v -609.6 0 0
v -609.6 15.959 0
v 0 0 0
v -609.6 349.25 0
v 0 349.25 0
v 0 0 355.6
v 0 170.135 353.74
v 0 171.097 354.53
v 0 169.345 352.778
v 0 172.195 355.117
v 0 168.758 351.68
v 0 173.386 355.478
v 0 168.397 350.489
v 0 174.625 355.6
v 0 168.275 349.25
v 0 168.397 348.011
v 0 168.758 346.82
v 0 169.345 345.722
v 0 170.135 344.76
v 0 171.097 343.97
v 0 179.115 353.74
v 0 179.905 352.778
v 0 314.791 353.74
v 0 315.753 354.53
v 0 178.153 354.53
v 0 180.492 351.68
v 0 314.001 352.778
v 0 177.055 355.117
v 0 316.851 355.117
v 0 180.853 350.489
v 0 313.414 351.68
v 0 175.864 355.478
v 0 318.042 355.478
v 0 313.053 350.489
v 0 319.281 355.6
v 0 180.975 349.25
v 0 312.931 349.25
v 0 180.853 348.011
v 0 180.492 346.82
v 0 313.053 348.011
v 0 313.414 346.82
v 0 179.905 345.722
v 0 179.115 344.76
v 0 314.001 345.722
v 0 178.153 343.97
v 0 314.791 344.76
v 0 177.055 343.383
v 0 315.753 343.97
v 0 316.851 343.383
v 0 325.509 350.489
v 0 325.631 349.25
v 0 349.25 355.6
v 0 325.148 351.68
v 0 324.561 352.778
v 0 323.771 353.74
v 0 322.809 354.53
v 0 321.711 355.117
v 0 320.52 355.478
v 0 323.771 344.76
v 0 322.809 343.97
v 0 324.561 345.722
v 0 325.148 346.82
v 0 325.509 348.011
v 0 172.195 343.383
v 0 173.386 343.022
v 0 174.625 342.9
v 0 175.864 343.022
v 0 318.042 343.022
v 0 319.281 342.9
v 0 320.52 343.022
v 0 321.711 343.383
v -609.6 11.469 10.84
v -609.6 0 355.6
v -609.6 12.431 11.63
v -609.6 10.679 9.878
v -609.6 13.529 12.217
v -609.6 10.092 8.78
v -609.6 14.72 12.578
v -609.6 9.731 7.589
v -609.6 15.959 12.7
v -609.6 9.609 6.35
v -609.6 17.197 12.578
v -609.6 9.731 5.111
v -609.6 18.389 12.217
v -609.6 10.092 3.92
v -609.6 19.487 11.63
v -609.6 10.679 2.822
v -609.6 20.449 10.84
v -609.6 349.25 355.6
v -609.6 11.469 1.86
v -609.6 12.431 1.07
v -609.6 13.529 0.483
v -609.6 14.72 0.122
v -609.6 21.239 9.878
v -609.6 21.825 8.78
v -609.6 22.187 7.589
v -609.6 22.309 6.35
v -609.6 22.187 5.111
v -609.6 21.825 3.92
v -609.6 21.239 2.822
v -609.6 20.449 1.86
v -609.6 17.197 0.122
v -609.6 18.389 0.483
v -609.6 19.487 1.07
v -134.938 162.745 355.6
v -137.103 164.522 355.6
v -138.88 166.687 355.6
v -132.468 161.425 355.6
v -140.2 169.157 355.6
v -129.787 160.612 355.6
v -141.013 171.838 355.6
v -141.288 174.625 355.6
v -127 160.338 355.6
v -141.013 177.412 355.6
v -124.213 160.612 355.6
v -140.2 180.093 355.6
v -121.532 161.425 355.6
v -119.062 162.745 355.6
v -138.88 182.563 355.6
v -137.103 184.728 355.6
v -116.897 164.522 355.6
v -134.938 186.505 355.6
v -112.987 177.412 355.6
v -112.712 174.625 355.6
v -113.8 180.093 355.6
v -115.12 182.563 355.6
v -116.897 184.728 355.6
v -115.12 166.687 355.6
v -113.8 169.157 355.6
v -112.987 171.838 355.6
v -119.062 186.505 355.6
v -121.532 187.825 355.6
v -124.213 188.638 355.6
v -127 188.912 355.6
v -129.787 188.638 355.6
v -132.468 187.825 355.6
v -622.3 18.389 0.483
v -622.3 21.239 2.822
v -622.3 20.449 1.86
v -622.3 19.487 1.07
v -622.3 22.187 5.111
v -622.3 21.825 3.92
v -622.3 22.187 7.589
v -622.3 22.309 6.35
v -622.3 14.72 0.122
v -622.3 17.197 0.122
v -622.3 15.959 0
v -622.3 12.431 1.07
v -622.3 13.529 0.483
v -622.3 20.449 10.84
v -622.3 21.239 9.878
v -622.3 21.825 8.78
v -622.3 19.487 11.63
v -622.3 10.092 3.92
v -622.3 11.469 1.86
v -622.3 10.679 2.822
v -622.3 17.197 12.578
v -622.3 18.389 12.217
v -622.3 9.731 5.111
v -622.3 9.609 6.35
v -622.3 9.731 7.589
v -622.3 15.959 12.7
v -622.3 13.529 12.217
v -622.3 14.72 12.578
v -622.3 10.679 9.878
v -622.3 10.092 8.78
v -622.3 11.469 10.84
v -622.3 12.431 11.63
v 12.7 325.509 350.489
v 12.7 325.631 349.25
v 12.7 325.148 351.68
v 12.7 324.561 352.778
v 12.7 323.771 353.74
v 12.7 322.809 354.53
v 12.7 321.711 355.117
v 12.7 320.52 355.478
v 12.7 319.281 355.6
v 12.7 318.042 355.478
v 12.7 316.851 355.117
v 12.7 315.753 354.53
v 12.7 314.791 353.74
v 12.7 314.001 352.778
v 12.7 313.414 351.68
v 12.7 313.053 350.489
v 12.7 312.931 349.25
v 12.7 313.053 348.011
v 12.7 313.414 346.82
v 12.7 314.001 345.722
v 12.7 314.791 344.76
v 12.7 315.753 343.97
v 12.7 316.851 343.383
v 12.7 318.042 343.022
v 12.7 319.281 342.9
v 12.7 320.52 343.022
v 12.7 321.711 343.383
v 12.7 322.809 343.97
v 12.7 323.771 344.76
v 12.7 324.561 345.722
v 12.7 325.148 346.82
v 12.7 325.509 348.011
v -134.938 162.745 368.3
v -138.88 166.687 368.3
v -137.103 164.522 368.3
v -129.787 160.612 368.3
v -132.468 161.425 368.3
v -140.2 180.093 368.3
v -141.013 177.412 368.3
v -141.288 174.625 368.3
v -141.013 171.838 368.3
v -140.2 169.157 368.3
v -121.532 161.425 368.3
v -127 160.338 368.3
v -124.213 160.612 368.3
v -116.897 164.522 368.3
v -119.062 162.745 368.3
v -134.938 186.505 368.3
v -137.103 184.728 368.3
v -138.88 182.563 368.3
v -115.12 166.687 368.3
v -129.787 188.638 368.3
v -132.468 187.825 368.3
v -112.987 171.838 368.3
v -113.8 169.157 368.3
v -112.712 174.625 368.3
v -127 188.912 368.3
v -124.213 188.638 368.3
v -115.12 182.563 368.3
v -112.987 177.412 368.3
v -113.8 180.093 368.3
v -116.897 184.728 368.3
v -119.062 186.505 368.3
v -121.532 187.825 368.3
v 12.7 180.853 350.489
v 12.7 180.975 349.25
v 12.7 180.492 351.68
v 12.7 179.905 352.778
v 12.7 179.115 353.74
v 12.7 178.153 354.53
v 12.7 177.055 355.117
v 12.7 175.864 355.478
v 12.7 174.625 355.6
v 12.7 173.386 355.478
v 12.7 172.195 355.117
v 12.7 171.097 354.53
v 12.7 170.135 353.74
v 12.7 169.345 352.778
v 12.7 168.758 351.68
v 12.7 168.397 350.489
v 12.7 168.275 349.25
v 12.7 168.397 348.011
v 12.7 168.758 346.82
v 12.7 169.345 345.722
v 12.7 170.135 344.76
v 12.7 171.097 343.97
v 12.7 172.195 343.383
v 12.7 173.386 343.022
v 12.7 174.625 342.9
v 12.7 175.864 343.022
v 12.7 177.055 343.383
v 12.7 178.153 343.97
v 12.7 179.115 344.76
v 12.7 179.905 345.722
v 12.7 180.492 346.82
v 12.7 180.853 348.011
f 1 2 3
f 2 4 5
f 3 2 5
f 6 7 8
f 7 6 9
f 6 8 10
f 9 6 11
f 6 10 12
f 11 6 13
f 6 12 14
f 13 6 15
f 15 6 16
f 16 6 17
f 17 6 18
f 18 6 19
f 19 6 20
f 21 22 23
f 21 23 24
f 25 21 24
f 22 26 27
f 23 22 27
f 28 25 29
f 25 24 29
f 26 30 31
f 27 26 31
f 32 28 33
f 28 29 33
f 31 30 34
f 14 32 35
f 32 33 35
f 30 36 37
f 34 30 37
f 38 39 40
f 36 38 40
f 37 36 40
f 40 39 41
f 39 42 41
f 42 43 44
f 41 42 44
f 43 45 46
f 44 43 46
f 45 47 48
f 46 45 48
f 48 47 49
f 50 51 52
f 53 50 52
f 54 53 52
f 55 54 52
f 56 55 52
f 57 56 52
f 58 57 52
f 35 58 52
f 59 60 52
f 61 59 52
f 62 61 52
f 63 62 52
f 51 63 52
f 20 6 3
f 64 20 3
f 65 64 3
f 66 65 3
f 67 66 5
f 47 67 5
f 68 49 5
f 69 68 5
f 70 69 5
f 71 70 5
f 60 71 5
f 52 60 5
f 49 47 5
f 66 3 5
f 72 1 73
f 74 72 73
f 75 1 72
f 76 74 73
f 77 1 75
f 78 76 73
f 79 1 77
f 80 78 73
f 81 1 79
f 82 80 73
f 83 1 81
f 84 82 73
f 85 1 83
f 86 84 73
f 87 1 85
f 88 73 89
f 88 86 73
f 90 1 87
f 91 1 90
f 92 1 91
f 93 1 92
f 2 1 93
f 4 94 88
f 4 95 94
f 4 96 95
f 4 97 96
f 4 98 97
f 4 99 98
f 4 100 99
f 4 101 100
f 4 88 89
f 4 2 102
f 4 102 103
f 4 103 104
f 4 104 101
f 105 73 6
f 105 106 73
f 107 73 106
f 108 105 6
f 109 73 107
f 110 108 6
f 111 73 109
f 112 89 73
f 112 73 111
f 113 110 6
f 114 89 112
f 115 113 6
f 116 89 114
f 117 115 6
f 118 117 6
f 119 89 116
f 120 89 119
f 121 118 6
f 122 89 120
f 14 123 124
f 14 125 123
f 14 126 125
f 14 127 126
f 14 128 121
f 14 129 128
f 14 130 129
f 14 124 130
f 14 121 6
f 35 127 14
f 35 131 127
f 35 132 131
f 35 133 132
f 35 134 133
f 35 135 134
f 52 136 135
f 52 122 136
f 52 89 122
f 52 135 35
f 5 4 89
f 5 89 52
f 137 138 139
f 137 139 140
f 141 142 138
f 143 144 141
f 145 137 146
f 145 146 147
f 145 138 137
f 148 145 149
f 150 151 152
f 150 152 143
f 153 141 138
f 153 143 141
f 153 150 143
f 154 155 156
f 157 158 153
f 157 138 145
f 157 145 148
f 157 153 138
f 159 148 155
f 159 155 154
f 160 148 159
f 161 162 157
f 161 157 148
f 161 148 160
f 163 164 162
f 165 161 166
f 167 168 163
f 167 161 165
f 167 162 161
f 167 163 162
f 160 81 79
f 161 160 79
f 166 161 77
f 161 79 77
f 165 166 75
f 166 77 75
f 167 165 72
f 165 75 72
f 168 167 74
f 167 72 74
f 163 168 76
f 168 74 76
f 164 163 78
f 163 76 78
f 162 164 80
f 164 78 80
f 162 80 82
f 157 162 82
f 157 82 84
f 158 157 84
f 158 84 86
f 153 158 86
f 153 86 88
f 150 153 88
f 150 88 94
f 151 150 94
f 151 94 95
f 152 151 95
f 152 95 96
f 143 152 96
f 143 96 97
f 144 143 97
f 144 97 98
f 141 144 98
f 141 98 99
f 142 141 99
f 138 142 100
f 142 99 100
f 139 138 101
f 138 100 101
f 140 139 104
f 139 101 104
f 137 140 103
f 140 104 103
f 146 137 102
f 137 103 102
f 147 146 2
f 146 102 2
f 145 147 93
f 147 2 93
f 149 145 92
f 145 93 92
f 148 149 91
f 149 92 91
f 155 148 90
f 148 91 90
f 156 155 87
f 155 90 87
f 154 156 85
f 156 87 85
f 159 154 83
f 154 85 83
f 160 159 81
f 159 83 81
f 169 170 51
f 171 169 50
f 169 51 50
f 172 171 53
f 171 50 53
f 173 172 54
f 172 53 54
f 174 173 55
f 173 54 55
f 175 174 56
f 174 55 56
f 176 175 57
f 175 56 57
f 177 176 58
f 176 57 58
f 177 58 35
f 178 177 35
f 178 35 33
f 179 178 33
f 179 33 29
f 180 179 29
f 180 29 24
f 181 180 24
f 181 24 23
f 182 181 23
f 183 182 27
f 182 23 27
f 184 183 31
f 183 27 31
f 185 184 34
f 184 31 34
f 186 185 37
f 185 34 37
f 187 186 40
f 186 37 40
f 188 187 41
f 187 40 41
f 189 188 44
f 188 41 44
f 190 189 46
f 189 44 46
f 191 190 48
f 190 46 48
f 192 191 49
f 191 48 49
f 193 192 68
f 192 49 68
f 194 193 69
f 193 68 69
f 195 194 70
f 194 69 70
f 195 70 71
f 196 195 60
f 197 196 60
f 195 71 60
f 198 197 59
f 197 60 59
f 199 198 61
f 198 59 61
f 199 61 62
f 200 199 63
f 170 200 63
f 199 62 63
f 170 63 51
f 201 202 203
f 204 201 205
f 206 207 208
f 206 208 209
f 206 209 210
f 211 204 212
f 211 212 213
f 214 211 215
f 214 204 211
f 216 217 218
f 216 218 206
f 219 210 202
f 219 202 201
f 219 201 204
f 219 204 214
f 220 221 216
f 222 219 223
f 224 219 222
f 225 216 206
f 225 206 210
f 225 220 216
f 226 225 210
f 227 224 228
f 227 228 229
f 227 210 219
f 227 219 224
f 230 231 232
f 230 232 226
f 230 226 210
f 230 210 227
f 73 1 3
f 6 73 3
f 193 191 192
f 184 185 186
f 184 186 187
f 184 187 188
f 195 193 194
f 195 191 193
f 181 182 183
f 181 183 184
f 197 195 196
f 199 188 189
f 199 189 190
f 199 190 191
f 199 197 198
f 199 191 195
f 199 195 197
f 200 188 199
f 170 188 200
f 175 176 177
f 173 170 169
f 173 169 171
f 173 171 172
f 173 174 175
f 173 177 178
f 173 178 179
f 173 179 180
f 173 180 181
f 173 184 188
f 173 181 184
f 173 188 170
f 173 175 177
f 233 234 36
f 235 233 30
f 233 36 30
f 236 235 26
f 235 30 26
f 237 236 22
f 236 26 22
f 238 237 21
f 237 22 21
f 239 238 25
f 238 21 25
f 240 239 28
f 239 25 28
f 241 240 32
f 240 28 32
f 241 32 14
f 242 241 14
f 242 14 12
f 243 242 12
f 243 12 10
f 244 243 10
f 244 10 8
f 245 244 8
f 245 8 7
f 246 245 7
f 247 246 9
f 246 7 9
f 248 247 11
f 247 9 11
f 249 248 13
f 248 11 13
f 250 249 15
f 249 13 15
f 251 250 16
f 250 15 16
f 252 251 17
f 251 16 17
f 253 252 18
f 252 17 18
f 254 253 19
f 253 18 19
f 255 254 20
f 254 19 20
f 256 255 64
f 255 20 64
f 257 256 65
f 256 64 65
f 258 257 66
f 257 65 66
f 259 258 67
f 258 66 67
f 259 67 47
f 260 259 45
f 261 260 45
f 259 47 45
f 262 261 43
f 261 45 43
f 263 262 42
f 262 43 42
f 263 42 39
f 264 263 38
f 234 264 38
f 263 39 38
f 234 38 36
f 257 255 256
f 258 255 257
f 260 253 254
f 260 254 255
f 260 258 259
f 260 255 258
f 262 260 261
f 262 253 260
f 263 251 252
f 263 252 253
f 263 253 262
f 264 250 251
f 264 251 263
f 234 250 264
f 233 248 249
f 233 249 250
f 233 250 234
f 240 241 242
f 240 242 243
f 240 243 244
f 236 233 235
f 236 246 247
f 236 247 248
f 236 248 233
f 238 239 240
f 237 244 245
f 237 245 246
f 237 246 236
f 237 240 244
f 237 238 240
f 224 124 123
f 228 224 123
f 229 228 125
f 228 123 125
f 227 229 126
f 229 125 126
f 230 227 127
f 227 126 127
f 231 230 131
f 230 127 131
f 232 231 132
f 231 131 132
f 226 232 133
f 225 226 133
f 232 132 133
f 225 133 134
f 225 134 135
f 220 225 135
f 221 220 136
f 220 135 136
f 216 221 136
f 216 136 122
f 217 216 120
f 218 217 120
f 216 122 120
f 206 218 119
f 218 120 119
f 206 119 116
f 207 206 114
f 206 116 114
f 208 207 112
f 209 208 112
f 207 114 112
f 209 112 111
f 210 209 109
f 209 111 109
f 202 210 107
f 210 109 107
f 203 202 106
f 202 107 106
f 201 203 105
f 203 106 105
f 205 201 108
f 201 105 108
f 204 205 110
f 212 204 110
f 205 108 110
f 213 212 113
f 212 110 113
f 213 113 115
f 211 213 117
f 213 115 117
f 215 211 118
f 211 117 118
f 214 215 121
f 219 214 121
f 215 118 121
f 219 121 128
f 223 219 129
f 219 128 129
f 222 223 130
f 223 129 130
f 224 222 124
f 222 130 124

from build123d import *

# Parameters (mm, degrees)
F0_W     = 609.6
F0_H     = 349.25
F1_DEPTH = 355.6
F3_DEPTH = 12.7
F4_R     = 6.35
F5_DEPTH = 12.7
F6_R     = 6.35
F7_DEPTH = 12.7


with BuildPart() as f1:
    # F0 (on Top) → F1 (new body)
    with BuildSketch(Plane.XY):
        with Locations((-304.8, 174.625)):
            Rectangle(F0_W, F0_H)
    extrude(amount=F1_DEPTH)

    # F2 (on face) → F3 (join)
    with BuildSketch(Plane.XY.offset(355.6)):
        with BuildLine():
            ThreePointArc((-141.2875, 174.625), (-127, 160.3375), (-112.7125, 174.625))
            ThreePointArc((-112.7125, 174.625), (-127, 188.9125), (-141.2875, 174.625))
        make_face()
    extrude(amount=F3_DEPTH)

    # F4 (on face) → F5 (join)
    with BuildSketch(Plane.YZ):
        with Locations((174.625, 349.25)):
            Circle(F4_R)
        with Locations((319.281042, 349.25)):
            Circle(F4_R)
    extrude(amount=F5_DEPTH)

    # F6 (on face) → F7 (join)
    with BuildSketch(Plane(origin=(-609.6, 0, 0), x_dir=(0, -1, 0), z_dir=(-1, 0, 0))):
        with Locations((-15.958672, 6.35)):
            Circle(F6_R)
    extrude(amount=F7_DEPTH)


solid = f1.part
